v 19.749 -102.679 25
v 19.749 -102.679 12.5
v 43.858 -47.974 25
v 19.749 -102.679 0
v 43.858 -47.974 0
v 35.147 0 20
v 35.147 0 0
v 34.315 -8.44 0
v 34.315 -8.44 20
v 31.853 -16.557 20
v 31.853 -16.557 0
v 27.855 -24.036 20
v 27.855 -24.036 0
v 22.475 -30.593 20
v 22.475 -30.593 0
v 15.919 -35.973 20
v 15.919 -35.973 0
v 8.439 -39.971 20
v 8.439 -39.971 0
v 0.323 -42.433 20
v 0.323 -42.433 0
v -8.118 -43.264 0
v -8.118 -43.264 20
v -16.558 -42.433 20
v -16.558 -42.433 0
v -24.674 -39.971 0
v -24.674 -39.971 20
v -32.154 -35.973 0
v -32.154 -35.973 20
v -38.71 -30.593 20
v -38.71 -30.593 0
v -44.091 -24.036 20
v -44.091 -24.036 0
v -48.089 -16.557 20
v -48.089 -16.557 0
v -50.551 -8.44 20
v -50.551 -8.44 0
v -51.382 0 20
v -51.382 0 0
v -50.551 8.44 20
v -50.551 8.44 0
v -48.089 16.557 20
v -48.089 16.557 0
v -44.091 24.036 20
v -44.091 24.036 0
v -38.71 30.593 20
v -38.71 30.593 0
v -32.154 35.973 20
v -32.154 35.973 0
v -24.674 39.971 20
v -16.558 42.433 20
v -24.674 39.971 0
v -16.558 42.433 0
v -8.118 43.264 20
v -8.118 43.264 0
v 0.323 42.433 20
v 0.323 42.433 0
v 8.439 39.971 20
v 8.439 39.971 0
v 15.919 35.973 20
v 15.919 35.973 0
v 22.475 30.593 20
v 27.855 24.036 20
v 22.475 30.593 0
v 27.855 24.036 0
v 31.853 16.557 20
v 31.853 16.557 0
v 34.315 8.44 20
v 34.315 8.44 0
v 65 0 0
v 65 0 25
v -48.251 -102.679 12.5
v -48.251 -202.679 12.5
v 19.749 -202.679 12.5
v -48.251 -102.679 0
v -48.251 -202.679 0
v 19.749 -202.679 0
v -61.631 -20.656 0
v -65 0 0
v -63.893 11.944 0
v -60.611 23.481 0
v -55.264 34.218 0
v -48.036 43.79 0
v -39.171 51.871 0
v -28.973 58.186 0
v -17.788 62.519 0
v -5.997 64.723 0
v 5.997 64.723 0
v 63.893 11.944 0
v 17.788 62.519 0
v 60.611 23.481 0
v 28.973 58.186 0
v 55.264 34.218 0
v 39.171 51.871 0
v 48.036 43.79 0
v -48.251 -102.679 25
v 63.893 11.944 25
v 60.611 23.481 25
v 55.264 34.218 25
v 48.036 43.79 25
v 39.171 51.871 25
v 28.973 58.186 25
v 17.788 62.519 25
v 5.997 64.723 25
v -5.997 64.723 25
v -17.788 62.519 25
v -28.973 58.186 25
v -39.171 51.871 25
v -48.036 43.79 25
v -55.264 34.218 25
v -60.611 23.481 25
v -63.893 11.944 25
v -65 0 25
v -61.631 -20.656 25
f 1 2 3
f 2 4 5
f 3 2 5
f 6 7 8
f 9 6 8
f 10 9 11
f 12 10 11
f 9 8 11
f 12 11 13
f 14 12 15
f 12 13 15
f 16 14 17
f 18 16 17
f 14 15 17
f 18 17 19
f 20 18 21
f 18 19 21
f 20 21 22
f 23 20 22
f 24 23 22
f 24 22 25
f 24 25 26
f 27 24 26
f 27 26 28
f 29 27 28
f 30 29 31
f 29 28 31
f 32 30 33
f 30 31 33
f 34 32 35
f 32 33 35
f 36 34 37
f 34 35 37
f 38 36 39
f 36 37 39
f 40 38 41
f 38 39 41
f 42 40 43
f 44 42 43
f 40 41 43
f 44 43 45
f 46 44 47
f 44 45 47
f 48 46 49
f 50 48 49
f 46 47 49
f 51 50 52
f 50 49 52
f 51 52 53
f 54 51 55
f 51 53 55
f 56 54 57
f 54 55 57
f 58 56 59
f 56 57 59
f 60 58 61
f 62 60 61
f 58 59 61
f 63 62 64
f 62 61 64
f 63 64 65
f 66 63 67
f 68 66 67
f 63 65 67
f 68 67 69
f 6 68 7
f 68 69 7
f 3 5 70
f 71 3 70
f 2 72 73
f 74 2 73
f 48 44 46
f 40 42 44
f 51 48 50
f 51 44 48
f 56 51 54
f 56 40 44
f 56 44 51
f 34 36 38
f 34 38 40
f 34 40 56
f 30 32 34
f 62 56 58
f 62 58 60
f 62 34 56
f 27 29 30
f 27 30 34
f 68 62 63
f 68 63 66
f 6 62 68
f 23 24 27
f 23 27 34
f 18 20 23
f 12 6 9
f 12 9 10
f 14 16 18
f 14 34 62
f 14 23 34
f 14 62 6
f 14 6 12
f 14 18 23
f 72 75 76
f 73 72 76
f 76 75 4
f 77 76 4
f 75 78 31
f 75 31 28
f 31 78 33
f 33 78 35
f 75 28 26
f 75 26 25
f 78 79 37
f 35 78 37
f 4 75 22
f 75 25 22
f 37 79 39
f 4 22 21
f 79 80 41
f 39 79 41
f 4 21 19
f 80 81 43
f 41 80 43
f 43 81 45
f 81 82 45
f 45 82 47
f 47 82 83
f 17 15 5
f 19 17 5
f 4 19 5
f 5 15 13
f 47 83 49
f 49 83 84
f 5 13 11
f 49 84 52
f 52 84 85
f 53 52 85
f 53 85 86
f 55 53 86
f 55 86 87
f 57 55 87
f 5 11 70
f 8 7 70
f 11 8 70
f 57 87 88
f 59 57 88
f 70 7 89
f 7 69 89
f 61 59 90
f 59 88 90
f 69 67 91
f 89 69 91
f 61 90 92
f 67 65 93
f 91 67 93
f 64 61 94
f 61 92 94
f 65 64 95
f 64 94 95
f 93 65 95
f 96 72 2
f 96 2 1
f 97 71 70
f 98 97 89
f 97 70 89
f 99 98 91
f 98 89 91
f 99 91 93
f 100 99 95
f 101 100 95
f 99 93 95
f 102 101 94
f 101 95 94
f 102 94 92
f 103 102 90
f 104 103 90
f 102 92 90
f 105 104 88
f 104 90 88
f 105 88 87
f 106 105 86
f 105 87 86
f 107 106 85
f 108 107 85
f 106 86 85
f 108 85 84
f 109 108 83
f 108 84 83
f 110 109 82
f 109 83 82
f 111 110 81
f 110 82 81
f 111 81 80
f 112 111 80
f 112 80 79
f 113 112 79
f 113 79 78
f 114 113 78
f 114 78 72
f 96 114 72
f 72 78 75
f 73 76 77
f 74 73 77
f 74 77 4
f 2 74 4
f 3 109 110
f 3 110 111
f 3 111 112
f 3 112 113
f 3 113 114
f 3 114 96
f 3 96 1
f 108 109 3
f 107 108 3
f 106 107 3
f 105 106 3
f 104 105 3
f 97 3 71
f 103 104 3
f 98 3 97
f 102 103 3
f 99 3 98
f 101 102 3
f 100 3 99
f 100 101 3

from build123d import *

# Parameters (mm, degrees)
F1_DEPTH = 25
F2_R     = 43.2644605555
F3_DEPTH = 20
F4_W     = 100
F4_H     = 12.5
F5_DEPTH = 113.2522414455


with BuildPart() as f1:
    # F0 (on Top) → F1 (new body)
    with BuildSketch(Plane.XY):
        with BuildLine():
            Line((43.8576357287, -47.9740324372), (65, 0))
            ThreePointArc((65, 0), (0, 65), (-65, 0))
            Line((-65, 0), (-61.6307134035, -20.655632776))
            ThreePointArc((-61.6307134035, -20.655632776), (-16.2955304461, -62.9242058947), (43.8576357287, -47.9740324372))
        make_face()
        with BuildLine():
            Line((19.7487585545, -102.6793643832), (43.8576357287, -47.9740324372))
            ThreePointArc((43.8576357287, -47.9740324372), (-16.2955304461, -62.9242058947), (-61.6307134035, -20.655632776))
            Line((-61.6307134035, -20.655632776), (-48.2512414455, -102.6793643832))
            Line((-48.2512414455, -102.6793643832), (-48.2512414455, -202.6793643832))
            Line((-48.2512414455, -202.6793643832), (19.7487585545, -202.6793643832))
            Line((19.7487585545, -202.6793643832), (19.7487585545, -102.6793643832))
        make_face()
    extrude(amount=F1_DEPTH)

    # F2 (on face) → F3 (cut)
    with BuildSketch(Plane(origin=(0, 0, 0), x_dir=(1, 0, 0), z_dir=(0, 0, -1))):
        with Locations((-8.1178825349, 0)):
            Circle(F2_R)
    extrude(amount=-F3_DEPTH, mode=Mode.SUBTRACT)

    # F4 (on face) → F5 (cut, through all)
    with BuildSketch(Plane(origin=(-48.2512414455, 0, 0), x_dir=(0, -1, 0), z_dir=(-1, 0, 0))):
        with Locations((152.6793643832, 18.75)):
            Rectangle(F4_W, F4_H)
    extrude(amount=-F5_DEPTH, mode=Mode.SUBTRACT)


solid = f1.part
